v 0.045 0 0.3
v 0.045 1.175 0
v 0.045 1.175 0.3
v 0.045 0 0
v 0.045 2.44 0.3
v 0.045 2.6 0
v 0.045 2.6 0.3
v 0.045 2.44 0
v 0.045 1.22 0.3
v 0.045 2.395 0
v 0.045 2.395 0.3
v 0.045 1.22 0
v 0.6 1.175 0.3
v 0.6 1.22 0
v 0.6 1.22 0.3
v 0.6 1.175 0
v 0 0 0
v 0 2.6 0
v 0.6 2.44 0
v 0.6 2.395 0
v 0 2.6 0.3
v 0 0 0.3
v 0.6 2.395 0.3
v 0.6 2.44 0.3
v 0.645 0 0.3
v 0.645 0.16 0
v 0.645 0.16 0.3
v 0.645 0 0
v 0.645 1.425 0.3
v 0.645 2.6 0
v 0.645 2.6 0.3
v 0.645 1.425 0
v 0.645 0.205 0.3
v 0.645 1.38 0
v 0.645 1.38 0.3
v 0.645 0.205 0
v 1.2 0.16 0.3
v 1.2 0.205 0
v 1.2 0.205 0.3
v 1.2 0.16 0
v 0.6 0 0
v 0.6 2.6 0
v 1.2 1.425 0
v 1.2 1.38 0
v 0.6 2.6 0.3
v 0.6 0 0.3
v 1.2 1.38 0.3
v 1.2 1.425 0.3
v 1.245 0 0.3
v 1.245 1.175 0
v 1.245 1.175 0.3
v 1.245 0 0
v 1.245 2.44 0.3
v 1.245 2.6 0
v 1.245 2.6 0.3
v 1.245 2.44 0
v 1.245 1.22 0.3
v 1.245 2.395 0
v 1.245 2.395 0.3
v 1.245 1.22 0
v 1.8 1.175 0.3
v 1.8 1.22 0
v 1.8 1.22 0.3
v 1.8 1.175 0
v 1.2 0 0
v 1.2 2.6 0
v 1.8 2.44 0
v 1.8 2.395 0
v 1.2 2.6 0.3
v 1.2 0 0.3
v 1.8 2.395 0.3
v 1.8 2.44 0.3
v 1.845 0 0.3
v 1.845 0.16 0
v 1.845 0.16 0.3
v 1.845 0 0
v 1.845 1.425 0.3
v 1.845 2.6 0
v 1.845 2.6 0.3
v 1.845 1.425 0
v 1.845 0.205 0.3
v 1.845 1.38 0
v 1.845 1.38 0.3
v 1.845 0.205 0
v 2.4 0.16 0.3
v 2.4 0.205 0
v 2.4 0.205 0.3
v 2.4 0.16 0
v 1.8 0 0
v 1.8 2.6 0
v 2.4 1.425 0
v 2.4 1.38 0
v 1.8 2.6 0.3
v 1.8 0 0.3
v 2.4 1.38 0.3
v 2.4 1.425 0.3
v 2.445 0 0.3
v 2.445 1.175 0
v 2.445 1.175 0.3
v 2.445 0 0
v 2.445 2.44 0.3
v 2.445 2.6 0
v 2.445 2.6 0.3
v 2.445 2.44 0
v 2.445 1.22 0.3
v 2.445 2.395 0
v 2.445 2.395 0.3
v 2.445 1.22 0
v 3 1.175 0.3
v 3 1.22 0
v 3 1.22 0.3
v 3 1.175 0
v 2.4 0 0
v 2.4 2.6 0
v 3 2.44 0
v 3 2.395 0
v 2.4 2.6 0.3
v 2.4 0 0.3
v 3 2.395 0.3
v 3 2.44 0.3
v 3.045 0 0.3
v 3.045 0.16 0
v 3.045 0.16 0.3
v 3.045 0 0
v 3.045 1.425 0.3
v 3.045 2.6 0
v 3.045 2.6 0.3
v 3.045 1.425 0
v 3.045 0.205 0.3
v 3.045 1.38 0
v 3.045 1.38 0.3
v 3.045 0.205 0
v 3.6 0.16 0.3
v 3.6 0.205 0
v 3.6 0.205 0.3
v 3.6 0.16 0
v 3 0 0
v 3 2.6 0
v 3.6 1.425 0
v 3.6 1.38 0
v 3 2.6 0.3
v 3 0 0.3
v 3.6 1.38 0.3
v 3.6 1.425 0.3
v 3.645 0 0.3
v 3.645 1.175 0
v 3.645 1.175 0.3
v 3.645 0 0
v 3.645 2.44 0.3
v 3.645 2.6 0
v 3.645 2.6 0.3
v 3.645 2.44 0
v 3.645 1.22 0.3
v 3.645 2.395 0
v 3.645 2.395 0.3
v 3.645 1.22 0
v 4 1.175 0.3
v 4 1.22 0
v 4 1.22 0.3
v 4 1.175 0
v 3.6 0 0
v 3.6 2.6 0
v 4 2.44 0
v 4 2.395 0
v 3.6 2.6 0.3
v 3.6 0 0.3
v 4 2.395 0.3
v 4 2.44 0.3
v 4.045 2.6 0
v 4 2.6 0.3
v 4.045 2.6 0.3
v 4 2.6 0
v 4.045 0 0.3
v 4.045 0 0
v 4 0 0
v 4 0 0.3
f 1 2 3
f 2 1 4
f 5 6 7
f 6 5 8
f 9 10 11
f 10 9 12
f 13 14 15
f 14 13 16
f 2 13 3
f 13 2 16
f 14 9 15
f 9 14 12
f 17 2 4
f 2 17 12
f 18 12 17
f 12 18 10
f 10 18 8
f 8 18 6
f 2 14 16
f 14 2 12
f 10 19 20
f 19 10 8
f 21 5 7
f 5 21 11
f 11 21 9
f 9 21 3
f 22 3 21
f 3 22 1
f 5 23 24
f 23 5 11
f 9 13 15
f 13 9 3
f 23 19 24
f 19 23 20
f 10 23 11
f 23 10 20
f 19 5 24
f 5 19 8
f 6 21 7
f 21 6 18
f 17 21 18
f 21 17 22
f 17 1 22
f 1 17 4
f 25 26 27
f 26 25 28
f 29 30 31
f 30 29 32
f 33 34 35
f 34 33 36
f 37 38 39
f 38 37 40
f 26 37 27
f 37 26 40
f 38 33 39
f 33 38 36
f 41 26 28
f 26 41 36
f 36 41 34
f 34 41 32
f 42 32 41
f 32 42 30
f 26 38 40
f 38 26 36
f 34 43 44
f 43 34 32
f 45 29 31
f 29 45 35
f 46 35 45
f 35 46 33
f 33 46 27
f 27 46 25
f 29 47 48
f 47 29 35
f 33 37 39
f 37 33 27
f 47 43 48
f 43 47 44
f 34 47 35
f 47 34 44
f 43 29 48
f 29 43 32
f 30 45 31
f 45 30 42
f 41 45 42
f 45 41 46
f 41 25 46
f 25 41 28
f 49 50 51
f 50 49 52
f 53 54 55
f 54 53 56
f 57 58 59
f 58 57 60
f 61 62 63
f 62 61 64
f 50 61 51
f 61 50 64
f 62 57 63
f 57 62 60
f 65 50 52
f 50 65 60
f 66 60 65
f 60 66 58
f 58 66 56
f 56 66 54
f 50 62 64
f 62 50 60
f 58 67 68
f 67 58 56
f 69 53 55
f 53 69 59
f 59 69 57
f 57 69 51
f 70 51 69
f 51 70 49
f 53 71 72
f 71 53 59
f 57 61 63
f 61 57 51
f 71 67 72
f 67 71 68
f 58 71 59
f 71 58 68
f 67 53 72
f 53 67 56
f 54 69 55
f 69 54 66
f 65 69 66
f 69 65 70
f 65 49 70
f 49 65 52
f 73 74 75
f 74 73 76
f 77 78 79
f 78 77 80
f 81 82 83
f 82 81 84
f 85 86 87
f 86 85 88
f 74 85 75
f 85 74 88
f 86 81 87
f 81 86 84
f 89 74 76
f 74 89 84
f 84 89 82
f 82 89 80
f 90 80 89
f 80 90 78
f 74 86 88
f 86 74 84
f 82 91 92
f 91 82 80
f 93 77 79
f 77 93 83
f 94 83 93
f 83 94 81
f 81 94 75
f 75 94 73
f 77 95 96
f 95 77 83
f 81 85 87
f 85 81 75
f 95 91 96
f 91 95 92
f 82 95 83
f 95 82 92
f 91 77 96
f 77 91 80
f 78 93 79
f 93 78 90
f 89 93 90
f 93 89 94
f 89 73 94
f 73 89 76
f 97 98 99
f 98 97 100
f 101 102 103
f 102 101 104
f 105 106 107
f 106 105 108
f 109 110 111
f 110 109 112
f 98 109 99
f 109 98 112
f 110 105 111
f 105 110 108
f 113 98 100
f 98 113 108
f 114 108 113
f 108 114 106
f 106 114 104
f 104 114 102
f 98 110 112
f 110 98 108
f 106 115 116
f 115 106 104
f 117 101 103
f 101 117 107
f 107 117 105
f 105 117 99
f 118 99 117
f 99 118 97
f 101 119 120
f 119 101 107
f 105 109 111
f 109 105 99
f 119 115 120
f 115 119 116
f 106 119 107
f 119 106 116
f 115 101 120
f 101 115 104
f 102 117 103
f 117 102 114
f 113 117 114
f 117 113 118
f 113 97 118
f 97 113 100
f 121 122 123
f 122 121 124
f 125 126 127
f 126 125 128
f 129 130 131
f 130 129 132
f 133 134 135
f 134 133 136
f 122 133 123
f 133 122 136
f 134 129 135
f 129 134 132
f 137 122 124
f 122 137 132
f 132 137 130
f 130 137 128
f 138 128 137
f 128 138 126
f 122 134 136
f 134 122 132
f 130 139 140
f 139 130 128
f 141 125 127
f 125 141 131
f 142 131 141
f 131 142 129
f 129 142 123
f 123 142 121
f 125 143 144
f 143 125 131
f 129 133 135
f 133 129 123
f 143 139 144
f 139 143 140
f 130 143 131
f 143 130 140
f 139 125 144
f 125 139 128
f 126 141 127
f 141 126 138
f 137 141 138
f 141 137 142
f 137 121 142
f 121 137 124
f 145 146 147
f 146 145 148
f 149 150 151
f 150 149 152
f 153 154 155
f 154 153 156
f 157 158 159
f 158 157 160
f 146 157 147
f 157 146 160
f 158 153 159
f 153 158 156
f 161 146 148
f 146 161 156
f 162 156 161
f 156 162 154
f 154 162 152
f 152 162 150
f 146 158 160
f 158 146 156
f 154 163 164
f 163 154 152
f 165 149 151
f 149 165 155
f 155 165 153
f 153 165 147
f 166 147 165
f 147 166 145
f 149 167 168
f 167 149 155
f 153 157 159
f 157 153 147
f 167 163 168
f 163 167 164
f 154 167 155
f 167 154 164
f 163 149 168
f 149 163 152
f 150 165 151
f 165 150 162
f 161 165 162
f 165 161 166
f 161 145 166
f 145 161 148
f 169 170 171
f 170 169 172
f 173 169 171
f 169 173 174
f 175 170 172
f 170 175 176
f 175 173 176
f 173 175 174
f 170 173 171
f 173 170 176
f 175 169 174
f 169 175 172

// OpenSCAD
module beam(l, w = 0.095, t = 0.045) {
    echo("beam ", t, w, "length", l);
    color("lightblue")
    rotate([90, 0, 90])
    cube([l, w, t]);
}

module wall(w, h, t, ccx = 0.6, ccy = 1.22) {
    let ( nbrX = ceil(w/ccx)
        , nbrY = floor(h/ccy)
        , yOffset = h - nbrY*ccy - ccy + 0.045
        , xOffset = nbrX*ccx - w
        )
        for (x = [0:nbrX - 1])
            translate([x*ccx, 0, 0])
            union() {
                beam(h, t);
                for (y = [1:nbrY])
                    let ( oy = x % 2 == 0 ? 0 : yOffset
                        , ox = x == nbrX - 1 ? xOffset : 0
                        )
                    translate([0.045, oy + y*ccy, 0])
                    rotate([0, 0, -90])
                    beam(ccx - 0.045 - ox, t);
            }
    // the last beam
    translate([w, 0, 0])
    beam(h, t);
}

wall(4, 2.6, 0.3);
